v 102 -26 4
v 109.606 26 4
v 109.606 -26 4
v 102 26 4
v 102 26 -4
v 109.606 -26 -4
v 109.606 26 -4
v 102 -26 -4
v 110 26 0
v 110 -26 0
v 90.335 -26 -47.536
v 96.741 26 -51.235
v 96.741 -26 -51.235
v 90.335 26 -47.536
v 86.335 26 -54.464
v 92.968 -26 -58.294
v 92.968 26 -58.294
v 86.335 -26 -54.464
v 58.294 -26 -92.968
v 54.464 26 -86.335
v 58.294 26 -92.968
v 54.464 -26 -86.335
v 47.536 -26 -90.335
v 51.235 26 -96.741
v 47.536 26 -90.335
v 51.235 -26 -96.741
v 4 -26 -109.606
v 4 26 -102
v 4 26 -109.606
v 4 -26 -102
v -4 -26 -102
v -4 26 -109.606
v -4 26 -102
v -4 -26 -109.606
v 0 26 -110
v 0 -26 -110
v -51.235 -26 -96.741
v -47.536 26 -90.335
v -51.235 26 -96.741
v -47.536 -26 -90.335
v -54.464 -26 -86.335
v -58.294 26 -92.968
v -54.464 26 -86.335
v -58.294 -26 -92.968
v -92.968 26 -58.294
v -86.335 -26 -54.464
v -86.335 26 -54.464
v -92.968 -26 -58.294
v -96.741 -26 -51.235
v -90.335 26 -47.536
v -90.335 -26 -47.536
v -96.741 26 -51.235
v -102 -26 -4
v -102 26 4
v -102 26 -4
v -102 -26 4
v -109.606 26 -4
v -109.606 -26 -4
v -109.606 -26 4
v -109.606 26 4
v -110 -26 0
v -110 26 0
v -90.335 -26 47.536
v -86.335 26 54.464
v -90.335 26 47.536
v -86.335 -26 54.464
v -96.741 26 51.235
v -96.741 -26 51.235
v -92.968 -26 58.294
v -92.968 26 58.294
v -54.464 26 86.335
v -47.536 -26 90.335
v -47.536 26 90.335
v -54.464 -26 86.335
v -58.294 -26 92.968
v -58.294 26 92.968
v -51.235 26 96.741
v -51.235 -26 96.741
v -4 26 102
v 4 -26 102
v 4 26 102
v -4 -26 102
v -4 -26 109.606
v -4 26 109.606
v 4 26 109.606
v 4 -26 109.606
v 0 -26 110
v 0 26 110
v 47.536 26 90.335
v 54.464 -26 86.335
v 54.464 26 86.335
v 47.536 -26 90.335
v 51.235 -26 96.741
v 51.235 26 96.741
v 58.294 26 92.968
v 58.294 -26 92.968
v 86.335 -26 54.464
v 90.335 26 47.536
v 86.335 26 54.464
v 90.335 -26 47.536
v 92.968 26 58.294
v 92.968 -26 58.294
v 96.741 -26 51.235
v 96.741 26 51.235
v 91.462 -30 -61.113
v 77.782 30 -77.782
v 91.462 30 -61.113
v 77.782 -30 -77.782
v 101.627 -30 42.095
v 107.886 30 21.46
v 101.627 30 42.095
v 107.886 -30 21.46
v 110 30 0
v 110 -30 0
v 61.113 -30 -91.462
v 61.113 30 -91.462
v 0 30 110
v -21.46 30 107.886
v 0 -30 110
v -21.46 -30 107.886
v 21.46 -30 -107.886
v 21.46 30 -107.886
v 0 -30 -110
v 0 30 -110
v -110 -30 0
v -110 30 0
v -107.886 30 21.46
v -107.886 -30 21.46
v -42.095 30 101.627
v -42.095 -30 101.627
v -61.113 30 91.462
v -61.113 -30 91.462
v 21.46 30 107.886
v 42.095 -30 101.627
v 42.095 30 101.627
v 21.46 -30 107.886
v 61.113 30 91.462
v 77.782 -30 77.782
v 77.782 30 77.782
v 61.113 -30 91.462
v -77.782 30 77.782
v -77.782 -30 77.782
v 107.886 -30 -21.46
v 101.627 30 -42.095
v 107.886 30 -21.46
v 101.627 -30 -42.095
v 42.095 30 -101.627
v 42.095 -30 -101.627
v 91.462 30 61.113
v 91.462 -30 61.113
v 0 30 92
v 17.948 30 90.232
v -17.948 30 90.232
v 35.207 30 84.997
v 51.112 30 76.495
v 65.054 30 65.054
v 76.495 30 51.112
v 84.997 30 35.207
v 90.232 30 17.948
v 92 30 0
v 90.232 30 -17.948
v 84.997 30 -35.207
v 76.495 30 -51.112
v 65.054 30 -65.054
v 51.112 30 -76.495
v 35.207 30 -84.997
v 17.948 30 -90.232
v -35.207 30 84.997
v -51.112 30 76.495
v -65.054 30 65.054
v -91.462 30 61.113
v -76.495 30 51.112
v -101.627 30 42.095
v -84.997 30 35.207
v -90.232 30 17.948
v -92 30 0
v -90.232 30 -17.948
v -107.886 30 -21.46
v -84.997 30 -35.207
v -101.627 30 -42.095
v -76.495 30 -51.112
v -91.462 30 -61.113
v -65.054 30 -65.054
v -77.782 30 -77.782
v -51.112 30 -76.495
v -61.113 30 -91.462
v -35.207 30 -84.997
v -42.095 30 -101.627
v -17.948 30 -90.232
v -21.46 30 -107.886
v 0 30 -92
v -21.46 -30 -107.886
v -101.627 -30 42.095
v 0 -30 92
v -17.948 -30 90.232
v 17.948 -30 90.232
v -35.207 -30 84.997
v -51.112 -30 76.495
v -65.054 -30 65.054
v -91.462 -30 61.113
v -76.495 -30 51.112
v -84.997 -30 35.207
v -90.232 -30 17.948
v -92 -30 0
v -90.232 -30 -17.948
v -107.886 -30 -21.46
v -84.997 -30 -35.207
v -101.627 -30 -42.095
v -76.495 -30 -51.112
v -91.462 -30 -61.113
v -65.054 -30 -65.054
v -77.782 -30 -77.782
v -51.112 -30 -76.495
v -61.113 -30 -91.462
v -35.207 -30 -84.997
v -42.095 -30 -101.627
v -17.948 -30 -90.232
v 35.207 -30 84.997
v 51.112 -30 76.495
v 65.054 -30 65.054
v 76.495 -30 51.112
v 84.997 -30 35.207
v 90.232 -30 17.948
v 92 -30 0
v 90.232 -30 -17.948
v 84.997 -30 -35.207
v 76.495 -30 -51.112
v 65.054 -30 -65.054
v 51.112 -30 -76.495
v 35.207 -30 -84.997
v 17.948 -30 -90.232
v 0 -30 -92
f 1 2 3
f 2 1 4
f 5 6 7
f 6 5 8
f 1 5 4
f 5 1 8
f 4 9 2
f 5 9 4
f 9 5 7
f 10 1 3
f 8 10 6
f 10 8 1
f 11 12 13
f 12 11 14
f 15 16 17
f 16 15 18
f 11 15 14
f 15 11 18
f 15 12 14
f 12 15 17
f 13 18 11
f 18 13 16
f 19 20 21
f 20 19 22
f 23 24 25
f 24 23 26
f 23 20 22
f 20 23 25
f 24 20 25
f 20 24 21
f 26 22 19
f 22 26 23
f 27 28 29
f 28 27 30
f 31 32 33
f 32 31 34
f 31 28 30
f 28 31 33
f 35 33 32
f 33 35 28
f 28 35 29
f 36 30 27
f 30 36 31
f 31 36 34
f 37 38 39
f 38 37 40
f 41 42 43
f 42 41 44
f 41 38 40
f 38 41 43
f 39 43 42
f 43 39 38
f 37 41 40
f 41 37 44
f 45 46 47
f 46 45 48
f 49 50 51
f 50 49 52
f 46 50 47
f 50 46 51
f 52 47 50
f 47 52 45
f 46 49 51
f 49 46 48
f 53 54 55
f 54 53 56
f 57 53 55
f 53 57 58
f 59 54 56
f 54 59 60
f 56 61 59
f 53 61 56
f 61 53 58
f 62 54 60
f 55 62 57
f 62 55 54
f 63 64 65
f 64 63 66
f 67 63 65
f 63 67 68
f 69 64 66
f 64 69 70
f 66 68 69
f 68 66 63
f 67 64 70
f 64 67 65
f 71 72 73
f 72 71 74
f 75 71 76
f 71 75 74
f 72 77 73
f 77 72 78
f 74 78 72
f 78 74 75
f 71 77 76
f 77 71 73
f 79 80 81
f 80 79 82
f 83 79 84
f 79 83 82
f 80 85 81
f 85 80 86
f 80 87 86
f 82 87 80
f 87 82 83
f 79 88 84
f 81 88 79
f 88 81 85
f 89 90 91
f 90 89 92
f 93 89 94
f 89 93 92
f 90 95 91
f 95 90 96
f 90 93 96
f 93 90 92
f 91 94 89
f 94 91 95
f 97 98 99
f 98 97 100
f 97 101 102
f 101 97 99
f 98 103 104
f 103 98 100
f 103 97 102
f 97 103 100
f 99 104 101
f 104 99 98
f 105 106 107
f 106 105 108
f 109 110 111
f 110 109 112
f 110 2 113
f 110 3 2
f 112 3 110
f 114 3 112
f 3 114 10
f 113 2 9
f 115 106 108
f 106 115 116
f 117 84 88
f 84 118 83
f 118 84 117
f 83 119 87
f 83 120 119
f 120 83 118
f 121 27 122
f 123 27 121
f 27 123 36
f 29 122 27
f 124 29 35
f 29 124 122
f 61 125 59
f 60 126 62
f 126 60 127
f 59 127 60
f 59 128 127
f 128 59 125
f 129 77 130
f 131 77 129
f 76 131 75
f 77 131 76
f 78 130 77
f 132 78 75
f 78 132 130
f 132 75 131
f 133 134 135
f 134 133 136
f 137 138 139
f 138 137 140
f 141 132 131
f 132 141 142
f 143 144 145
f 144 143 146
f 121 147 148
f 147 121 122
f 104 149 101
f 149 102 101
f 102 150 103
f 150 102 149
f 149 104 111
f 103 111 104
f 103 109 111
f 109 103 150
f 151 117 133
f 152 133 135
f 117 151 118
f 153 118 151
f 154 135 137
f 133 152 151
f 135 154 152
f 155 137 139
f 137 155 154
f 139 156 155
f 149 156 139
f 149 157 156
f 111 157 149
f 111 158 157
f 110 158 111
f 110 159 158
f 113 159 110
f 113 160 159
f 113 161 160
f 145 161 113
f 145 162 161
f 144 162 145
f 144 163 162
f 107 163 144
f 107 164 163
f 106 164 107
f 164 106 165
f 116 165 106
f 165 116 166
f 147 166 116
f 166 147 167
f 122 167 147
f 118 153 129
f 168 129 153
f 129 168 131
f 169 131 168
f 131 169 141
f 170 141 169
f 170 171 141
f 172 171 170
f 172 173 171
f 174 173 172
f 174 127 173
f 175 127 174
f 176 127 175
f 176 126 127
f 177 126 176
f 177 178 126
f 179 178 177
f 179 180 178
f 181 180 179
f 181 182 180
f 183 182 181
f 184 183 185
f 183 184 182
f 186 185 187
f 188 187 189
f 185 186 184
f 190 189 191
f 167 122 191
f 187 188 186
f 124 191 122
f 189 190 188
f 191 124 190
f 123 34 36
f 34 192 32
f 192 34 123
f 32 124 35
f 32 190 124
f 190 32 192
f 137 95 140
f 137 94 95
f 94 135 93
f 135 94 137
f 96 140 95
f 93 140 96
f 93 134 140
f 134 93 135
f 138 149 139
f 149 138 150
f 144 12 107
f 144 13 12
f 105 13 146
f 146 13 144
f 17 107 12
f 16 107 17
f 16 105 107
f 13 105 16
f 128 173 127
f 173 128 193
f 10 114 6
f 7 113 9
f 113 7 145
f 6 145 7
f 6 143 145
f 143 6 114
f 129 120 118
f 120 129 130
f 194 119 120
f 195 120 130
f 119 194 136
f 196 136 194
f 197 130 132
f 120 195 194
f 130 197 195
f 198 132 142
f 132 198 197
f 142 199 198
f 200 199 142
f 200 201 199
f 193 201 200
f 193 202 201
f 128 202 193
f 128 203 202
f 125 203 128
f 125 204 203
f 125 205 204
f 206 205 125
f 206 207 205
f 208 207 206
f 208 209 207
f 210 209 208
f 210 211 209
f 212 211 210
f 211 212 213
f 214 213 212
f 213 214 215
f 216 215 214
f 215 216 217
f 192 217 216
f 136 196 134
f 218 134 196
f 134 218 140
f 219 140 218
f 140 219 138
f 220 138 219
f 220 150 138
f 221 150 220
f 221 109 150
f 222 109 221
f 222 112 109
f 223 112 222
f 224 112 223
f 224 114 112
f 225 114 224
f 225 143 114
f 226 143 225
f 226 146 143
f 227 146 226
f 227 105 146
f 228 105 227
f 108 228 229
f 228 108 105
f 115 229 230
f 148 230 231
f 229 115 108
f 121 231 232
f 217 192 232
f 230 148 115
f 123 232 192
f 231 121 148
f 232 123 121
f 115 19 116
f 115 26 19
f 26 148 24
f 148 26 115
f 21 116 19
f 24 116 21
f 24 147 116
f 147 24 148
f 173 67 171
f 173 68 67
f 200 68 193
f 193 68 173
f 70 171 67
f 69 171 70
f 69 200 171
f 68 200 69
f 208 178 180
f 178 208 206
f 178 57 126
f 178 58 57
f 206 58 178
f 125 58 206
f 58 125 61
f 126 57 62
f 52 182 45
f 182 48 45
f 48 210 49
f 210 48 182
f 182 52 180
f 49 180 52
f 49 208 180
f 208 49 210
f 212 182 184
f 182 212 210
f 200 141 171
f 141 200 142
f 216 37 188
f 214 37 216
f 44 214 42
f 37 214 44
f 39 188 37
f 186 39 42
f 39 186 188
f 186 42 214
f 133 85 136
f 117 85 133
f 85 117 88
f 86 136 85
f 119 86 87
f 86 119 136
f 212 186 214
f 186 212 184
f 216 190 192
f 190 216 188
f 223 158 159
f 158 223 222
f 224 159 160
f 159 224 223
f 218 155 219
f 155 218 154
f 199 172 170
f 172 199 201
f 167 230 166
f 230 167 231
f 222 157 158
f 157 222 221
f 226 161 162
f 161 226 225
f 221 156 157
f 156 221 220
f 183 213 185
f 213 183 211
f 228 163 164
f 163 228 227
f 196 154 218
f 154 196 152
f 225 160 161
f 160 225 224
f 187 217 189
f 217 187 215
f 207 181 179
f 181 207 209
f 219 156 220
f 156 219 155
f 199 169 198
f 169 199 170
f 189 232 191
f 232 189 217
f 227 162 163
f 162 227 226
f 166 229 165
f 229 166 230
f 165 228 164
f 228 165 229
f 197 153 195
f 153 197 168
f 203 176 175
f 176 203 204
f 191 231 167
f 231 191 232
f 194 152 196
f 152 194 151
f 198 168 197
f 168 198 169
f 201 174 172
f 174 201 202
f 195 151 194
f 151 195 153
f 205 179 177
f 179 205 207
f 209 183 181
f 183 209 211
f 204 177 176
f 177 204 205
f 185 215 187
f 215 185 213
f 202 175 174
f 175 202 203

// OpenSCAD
use <main.scad>
drive_wheel_diameter = 220;
drive_wheel_radius   = 110;
drive_wheel_width    = 60;
drive_wheel_track    = 620;
drive_wheel_axle_z   = 110;
show_component_labels = false;
translate([0, -drive_wheel_track / 2, -drive_wheel_axle_z])
    drive_wheel_tire(1, 0);
